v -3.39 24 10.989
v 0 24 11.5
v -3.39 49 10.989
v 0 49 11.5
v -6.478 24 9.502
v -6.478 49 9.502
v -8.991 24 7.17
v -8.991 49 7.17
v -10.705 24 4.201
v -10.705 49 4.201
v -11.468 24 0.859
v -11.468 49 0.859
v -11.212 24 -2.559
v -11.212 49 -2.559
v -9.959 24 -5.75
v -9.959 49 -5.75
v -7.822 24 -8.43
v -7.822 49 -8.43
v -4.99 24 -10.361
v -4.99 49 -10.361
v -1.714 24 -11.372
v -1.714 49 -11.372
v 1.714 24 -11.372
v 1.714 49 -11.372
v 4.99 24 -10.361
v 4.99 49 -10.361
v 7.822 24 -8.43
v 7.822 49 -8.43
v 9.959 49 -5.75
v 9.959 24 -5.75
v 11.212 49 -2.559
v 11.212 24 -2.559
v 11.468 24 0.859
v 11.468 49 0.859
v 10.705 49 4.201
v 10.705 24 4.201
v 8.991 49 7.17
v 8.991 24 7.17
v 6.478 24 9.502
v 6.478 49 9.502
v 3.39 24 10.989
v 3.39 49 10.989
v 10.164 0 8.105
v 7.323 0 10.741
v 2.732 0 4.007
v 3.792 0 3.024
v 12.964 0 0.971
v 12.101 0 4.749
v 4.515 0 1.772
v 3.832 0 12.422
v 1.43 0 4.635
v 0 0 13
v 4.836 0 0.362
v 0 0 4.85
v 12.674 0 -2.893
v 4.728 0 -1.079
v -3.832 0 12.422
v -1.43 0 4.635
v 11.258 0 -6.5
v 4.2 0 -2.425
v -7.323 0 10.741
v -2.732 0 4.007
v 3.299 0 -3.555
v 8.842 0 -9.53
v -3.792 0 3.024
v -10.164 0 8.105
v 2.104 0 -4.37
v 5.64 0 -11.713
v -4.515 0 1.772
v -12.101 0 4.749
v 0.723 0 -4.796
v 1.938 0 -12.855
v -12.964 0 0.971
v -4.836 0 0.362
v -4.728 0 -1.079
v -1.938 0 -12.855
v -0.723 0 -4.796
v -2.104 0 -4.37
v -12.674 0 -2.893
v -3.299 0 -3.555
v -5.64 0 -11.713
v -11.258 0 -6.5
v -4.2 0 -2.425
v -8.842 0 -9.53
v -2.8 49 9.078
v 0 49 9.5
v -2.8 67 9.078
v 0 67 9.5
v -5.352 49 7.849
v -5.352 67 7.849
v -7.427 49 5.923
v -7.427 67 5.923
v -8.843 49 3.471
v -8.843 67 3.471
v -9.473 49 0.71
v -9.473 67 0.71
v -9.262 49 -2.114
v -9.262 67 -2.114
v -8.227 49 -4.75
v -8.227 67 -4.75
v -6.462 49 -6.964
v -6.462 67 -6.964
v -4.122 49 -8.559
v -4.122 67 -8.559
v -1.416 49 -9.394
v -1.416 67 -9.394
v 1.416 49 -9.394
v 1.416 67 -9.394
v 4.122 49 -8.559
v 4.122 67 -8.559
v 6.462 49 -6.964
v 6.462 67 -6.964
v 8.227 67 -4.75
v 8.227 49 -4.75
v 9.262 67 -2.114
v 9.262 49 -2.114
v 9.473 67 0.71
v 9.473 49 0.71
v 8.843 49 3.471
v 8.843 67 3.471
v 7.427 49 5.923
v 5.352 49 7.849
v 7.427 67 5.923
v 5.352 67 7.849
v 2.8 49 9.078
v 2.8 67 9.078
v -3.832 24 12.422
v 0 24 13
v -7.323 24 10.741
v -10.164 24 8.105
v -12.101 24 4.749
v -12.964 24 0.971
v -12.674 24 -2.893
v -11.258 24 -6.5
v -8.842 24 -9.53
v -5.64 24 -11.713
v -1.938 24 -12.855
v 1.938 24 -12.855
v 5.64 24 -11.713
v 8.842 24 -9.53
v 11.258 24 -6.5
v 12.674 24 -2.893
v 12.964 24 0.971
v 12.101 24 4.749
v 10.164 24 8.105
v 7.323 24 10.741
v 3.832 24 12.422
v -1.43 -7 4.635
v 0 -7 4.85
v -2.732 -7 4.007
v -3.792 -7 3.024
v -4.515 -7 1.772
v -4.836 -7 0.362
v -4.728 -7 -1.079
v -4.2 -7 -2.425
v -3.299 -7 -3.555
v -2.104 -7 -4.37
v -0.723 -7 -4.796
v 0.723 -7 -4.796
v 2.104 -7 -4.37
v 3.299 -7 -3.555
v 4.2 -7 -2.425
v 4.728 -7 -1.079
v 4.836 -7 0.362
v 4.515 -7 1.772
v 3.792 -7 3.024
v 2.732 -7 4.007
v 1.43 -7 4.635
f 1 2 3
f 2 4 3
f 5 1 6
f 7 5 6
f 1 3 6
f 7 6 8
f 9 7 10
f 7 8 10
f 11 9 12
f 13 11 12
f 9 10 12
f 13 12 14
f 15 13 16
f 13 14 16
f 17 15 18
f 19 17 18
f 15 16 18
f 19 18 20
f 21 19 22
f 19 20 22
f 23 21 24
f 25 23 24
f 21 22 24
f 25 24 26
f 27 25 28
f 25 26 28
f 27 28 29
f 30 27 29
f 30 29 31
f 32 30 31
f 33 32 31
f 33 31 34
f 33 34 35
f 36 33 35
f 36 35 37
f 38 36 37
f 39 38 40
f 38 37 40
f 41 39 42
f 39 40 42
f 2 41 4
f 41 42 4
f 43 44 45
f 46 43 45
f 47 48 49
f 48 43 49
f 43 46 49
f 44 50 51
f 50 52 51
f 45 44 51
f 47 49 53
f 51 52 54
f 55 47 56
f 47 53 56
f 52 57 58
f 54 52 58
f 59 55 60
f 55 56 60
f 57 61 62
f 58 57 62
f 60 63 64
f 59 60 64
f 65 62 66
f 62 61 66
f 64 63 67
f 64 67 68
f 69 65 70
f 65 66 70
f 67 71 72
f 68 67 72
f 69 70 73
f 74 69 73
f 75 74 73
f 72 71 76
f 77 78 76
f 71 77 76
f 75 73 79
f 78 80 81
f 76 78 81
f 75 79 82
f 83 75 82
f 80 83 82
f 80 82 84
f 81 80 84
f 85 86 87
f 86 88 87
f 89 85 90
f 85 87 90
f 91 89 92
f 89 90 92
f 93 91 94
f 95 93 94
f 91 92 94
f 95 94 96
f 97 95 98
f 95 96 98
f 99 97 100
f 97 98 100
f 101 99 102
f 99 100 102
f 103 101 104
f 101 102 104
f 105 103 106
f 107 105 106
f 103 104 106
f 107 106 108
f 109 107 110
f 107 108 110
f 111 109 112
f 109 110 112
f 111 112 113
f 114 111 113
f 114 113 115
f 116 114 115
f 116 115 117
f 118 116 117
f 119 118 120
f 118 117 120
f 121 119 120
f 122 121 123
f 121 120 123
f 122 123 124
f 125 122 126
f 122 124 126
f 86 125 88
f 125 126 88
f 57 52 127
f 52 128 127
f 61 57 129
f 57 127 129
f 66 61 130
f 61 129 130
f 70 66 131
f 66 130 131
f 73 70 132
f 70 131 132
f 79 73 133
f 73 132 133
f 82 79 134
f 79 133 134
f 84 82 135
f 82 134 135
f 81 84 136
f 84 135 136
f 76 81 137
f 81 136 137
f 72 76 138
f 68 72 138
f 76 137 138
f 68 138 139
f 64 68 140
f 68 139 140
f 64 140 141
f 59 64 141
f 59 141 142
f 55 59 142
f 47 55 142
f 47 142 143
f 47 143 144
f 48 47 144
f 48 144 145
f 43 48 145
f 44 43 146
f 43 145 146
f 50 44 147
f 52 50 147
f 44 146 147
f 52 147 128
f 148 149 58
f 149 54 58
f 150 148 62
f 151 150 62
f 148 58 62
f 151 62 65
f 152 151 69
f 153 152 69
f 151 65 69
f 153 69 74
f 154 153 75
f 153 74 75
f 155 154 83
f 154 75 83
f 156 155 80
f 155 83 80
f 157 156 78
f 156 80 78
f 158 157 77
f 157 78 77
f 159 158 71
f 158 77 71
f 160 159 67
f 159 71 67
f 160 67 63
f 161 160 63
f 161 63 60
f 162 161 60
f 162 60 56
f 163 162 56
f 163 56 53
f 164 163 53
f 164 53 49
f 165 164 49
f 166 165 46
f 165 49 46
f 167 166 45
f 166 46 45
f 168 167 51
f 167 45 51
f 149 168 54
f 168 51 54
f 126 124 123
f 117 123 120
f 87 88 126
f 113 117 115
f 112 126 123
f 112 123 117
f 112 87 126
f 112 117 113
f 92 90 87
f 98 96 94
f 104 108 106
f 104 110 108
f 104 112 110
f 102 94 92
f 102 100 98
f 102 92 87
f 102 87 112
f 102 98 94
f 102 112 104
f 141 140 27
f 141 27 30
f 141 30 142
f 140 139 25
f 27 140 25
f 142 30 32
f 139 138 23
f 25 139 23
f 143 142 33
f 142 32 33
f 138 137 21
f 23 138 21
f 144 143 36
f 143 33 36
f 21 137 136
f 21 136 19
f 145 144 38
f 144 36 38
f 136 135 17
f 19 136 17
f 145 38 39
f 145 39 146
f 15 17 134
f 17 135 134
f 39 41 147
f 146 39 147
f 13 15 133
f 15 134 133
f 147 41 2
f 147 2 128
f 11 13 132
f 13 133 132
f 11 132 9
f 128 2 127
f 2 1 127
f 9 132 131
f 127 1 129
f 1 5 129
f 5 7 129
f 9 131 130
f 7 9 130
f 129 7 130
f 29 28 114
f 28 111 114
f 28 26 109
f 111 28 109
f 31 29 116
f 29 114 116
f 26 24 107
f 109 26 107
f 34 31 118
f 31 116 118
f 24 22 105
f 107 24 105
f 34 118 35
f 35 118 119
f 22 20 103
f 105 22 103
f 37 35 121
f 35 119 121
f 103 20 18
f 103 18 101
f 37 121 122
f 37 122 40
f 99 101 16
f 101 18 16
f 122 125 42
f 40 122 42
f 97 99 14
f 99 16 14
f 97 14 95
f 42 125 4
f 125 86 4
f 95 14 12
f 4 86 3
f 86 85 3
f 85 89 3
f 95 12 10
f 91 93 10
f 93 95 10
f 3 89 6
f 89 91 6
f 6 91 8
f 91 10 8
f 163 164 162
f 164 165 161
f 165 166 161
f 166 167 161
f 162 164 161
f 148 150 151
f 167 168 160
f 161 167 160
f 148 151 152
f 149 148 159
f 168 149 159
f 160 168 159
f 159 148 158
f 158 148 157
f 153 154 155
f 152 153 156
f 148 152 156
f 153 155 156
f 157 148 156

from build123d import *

# Parameters (mm, degrees)
SKETCH_1_W   = 9.5
SKETCH_1_H   = 6
SKETCH_1_W_2 = 4.85
SKETCH_1_H_2 = 7


with BuildPart() as part:
    # Эскиз1 → Повернуть1 (revolve)
    with BuildSketch(Plane.XY, mode=Mode.PRIVATE) as revolve_1_sk:
        with Locations((4.75, 64)):
            Rectangle(SKETCH_1_W, SKETCH_1_H)
        Polygon((9.5, 61), (0, 61), (0, 0), (4.85, 0), (13, 0), (13, 24), (11.5, 24), (11.5, 49), (9.5, 49), align=None)
        with Locations((2.425, -3.5)):
            Rectangle(SKETCH_1_W_2, SKETCH_1_H_2)
    revolve(revolve_1_sk.sketch.rotate(Axis((0, 73.447142448, 0), (0, -1, 0)), 90), axis=Axis((0, 73.447142448, 0), (0, -1, 0)))


solid = part.part
